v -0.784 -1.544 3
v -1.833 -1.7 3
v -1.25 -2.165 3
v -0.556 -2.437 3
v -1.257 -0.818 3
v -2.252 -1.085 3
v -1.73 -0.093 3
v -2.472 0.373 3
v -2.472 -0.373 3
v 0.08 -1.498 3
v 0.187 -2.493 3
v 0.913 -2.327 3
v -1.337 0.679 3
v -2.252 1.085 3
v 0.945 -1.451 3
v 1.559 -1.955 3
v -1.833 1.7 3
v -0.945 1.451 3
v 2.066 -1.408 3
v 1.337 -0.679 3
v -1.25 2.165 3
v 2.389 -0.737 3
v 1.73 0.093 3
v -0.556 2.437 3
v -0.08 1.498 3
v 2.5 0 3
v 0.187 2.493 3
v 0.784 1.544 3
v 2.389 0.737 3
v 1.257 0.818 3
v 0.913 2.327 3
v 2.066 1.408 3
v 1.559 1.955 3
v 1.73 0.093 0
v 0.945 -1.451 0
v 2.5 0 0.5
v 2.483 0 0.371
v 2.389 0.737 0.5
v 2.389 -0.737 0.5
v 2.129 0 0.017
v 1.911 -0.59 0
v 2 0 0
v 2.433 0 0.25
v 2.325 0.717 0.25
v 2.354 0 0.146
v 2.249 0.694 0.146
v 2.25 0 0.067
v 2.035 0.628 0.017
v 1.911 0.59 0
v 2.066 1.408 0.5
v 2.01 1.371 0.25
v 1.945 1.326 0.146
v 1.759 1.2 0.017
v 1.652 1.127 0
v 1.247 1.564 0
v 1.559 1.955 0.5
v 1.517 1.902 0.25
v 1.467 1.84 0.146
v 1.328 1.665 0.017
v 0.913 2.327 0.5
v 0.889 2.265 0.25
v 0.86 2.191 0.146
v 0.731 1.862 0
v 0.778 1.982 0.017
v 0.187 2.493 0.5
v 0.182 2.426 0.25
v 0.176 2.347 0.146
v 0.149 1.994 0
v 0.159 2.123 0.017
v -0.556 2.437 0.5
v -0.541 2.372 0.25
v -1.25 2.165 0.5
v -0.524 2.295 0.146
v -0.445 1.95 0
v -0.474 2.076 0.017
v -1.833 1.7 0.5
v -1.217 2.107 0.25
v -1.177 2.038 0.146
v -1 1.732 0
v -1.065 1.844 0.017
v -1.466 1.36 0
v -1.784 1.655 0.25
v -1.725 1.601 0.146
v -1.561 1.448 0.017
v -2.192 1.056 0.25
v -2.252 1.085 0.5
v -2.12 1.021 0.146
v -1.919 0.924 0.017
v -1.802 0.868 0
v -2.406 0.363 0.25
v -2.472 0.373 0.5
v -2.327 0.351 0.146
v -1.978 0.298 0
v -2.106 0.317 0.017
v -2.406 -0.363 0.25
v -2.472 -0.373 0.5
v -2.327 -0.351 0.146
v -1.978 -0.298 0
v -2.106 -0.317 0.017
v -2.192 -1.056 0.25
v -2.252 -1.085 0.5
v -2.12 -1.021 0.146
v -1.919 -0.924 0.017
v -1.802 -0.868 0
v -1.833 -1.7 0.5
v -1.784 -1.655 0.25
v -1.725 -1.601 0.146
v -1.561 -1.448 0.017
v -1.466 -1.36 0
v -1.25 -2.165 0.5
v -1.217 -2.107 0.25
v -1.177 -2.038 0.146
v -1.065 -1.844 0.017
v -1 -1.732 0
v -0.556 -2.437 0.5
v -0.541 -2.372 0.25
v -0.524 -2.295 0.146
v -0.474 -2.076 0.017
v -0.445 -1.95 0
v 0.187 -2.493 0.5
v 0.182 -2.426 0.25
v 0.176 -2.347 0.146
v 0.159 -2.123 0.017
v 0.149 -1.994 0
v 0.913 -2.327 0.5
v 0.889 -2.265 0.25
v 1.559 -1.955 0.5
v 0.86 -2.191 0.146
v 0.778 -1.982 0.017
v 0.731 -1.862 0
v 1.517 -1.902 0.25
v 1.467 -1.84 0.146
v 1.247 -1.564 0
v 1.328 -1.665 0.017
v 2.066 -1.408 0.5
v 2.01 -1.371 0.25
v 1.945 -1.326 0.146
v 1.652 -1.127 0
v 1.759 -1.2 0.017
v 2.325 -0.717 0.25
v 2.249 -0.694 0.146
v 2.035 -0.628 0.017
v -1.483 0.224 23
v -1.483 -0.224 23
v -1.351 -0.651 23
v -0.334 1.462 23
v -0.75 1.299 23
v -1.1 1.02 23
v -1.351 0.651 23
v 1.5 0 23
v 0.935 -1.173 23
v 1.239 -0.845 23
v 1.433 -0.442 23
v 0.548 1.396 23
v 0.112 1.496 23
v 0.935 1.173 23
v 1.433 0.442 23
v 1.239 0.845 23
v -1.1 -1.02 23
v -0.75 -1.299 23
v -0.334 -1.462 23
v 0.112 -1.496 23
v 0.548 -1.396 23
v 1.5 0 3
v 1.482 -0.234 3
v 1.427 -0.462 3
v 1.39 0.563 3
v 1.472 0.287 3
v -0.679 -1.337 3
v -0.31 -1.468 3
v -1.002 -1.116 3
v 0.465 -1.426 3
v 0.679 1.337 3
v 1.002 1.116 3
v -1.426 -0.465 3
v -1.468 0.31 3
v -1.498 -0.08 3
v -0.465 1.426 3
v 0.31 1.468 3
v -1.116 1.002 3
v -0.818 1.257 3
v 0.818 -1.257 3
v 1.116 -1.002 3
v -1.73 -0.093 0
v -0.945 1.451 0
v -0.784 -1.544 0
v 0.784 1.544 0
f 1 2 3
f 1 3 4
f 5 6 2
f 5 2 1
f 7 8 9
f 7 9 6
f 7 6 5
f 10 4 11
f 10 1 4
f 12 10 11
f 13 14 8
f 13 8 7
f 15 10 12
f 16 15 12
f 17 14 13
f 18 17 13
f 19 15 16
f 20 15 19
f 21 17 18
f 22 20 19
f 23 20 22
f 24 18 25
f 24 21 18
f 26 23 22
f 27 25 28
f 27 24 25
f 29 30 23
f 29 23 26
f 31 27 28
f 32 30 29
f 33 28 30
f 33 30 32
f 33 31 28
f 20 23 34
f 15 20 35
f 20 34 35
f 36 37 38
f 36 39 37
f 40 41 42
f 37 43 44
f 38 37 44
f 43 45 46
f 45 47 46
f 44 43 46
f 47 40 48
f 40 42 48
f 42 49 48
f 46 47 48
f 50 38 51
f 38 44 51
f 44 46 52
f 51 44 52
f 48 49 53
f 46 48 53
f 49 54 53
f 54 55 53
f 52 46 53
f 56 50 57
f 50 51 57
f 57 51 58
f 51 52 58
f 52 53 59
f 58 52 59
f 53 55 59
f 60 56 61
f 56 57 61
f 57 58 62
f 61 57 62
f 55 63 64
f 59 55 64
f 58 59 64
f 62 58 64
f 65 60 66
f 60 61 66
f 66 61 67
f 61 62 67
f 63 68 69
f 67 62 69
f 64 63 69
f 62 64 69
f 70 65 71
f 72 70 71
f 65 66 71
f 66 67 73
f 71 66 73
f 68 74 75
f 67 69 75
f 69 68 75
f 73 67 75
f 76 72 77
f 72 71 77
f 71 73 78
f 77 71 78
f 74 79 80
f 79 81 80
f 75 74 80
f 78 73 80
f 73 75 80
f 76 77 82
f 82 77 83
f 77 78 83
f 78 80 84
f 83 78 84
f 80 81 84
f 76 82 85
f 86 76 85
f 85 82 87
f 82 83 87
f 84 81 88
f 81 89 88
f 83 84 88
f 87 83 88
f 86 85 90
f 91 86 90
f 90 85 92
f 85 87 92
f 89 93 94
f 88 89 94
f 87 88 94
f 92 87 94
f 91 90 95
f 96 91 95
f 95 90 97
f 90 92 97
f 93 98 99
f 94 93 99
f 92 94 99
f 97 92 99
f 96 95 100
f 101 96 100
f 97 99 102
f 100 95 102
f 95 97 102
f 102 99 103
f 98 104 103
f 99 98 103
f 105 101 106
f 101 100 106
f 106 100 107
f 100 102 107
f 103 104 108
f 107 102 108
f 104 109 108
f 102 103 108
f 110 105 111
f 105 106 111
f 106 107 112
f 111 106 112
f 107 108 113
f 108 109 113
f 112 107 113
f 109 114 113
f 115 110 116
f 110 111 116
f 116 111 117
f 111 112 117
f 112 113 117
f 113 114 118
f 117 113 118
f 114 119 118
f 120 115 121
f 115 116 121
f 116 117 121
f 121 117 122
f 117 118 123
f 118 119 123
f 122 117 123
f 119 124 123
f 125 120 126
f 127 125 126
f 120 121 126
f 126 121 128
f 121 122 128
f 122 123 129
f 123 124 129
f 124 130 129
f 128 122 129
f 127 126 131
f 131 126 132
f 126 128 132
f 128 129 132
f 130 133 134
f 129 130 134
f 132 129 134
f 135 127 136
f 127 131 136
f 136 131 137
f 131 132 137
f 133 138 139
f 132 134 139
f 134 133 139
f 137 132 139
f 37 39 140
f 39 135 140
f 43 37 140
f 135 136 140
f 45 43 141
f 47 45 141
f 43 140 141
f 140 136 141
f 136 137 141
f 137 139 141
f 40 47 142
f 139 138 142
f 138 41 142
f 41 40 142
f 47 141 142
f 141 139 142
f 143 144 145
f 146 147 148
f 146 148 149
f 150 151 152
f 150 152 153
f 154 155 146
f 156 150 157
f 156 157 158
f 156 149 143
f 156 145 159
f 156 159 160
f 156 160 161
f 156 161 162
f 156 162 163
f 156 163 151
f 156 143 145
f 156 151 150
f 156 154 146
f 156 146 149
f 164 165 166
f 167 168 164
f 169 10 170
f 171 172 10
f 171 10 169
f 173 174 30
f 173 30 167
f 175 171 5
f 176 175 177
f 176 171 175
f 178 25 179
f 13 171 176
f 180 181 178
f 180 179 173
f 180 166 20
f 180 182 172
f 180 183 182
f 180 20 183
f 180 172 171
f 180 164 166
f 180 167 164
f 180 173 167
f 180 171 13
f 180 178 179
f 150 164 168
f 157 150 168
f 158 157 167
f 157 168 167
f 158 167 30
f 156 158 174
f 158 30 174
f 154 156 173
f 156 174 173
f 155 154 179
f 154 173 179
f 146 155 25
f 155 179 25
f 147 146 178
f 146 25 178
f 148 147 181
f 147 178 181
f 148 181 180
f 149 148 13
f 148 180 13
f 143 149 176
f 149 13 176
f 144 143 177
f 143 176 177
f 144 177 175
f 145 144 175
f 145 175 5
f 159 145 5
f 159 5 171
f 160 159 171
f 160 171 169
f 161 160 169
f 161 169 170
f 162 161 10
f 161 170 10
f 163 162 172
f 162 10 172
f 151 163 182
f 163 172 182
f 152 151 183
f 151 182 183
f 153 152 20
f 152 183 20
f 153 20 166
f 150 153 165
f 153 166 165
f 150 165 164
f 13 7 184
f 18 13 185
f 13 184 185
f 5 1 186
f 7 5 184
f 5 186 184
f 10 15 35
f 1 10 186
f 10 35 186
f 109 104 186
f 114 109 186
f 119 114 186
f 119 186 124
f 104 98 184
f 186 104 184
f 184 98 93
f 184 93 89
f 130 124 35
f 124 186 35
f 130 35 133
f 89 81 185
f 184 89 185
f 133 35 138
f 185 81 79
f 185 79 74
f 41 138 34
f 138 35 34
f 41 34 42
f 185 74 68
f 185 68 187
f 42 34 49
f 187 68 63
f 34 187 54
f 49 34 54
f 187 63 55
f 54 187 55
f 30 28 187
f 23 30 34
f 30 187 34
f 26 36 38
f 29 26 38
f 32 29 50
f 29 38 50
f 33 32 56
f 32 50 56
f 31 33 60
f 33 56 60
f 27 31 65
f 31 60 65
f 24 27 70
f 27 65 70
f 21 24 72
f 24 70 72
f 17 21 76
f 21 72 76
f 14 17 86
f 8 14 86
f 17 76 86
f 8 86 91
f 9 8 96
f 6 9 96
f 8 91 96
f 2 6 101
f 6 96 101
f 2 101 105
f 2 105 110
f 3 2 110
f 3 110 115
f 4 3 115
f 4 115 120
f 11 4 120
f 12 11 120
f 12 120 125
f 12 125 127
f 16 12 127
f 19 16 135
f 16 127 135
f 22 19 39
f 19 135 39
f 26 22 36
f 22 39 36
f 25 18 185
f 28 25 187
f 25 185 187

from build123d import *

# Parameters (mm, degrees)
SKETCH1_R           = 2.5
BOSS_EXTRUDE1_DEPTH = 3
SKETCH2_R           = 1.5
BOSS_EXTRUDE2_DEPTH = 20
CUT_EXTRUDE1_DEPTH  = 3
FILLET1_R           = 0.5


with BuildPart() as part:
    # Sketch1 → Boss-Extrude1 (new body)
    with BuildSketch(Plane.XY):
        Circle(SKETCH1_R)
    extrude(amount=BOSS_EXTRUDE1_DEPTH)

    # Sketch2 → Boss-Extrude2 (add)
    with BuildSketch(Plane.XY.offset(3)):
        Circle(SKETCH2_R)
    extrude(amount=BOSS_EXTRUDE2_DEPTH)

    # Sketch3 → Cut-Extrude1 (cut)
    with BuildSketch(Plane(origin=(0, 0, 0), x_dir=(-1, 0, 0), z_dir=(0, 0, -1))):
        Polygon((0.784462107, -1.544221229), (1.729565866, -0.092746502), (0.94510376, 1.451474727), (-0.784462107, 1.544221229), (-1.729565866, 0.092746502), (-0.94510376, -1.451474727), align=None)
    extrude(amount=-CUT_EXTRUDE1_DEPTH, mode=Mode.SUBTRACT)

    # Fillet1
    fillet1_edges = [part.edges().sort_by_distance(p)[0] for p in [
        (-2.5, 0, 0),
    ]]
    fillet(fillet1_edges, radius=FILLET1_R)


solid = part.part
